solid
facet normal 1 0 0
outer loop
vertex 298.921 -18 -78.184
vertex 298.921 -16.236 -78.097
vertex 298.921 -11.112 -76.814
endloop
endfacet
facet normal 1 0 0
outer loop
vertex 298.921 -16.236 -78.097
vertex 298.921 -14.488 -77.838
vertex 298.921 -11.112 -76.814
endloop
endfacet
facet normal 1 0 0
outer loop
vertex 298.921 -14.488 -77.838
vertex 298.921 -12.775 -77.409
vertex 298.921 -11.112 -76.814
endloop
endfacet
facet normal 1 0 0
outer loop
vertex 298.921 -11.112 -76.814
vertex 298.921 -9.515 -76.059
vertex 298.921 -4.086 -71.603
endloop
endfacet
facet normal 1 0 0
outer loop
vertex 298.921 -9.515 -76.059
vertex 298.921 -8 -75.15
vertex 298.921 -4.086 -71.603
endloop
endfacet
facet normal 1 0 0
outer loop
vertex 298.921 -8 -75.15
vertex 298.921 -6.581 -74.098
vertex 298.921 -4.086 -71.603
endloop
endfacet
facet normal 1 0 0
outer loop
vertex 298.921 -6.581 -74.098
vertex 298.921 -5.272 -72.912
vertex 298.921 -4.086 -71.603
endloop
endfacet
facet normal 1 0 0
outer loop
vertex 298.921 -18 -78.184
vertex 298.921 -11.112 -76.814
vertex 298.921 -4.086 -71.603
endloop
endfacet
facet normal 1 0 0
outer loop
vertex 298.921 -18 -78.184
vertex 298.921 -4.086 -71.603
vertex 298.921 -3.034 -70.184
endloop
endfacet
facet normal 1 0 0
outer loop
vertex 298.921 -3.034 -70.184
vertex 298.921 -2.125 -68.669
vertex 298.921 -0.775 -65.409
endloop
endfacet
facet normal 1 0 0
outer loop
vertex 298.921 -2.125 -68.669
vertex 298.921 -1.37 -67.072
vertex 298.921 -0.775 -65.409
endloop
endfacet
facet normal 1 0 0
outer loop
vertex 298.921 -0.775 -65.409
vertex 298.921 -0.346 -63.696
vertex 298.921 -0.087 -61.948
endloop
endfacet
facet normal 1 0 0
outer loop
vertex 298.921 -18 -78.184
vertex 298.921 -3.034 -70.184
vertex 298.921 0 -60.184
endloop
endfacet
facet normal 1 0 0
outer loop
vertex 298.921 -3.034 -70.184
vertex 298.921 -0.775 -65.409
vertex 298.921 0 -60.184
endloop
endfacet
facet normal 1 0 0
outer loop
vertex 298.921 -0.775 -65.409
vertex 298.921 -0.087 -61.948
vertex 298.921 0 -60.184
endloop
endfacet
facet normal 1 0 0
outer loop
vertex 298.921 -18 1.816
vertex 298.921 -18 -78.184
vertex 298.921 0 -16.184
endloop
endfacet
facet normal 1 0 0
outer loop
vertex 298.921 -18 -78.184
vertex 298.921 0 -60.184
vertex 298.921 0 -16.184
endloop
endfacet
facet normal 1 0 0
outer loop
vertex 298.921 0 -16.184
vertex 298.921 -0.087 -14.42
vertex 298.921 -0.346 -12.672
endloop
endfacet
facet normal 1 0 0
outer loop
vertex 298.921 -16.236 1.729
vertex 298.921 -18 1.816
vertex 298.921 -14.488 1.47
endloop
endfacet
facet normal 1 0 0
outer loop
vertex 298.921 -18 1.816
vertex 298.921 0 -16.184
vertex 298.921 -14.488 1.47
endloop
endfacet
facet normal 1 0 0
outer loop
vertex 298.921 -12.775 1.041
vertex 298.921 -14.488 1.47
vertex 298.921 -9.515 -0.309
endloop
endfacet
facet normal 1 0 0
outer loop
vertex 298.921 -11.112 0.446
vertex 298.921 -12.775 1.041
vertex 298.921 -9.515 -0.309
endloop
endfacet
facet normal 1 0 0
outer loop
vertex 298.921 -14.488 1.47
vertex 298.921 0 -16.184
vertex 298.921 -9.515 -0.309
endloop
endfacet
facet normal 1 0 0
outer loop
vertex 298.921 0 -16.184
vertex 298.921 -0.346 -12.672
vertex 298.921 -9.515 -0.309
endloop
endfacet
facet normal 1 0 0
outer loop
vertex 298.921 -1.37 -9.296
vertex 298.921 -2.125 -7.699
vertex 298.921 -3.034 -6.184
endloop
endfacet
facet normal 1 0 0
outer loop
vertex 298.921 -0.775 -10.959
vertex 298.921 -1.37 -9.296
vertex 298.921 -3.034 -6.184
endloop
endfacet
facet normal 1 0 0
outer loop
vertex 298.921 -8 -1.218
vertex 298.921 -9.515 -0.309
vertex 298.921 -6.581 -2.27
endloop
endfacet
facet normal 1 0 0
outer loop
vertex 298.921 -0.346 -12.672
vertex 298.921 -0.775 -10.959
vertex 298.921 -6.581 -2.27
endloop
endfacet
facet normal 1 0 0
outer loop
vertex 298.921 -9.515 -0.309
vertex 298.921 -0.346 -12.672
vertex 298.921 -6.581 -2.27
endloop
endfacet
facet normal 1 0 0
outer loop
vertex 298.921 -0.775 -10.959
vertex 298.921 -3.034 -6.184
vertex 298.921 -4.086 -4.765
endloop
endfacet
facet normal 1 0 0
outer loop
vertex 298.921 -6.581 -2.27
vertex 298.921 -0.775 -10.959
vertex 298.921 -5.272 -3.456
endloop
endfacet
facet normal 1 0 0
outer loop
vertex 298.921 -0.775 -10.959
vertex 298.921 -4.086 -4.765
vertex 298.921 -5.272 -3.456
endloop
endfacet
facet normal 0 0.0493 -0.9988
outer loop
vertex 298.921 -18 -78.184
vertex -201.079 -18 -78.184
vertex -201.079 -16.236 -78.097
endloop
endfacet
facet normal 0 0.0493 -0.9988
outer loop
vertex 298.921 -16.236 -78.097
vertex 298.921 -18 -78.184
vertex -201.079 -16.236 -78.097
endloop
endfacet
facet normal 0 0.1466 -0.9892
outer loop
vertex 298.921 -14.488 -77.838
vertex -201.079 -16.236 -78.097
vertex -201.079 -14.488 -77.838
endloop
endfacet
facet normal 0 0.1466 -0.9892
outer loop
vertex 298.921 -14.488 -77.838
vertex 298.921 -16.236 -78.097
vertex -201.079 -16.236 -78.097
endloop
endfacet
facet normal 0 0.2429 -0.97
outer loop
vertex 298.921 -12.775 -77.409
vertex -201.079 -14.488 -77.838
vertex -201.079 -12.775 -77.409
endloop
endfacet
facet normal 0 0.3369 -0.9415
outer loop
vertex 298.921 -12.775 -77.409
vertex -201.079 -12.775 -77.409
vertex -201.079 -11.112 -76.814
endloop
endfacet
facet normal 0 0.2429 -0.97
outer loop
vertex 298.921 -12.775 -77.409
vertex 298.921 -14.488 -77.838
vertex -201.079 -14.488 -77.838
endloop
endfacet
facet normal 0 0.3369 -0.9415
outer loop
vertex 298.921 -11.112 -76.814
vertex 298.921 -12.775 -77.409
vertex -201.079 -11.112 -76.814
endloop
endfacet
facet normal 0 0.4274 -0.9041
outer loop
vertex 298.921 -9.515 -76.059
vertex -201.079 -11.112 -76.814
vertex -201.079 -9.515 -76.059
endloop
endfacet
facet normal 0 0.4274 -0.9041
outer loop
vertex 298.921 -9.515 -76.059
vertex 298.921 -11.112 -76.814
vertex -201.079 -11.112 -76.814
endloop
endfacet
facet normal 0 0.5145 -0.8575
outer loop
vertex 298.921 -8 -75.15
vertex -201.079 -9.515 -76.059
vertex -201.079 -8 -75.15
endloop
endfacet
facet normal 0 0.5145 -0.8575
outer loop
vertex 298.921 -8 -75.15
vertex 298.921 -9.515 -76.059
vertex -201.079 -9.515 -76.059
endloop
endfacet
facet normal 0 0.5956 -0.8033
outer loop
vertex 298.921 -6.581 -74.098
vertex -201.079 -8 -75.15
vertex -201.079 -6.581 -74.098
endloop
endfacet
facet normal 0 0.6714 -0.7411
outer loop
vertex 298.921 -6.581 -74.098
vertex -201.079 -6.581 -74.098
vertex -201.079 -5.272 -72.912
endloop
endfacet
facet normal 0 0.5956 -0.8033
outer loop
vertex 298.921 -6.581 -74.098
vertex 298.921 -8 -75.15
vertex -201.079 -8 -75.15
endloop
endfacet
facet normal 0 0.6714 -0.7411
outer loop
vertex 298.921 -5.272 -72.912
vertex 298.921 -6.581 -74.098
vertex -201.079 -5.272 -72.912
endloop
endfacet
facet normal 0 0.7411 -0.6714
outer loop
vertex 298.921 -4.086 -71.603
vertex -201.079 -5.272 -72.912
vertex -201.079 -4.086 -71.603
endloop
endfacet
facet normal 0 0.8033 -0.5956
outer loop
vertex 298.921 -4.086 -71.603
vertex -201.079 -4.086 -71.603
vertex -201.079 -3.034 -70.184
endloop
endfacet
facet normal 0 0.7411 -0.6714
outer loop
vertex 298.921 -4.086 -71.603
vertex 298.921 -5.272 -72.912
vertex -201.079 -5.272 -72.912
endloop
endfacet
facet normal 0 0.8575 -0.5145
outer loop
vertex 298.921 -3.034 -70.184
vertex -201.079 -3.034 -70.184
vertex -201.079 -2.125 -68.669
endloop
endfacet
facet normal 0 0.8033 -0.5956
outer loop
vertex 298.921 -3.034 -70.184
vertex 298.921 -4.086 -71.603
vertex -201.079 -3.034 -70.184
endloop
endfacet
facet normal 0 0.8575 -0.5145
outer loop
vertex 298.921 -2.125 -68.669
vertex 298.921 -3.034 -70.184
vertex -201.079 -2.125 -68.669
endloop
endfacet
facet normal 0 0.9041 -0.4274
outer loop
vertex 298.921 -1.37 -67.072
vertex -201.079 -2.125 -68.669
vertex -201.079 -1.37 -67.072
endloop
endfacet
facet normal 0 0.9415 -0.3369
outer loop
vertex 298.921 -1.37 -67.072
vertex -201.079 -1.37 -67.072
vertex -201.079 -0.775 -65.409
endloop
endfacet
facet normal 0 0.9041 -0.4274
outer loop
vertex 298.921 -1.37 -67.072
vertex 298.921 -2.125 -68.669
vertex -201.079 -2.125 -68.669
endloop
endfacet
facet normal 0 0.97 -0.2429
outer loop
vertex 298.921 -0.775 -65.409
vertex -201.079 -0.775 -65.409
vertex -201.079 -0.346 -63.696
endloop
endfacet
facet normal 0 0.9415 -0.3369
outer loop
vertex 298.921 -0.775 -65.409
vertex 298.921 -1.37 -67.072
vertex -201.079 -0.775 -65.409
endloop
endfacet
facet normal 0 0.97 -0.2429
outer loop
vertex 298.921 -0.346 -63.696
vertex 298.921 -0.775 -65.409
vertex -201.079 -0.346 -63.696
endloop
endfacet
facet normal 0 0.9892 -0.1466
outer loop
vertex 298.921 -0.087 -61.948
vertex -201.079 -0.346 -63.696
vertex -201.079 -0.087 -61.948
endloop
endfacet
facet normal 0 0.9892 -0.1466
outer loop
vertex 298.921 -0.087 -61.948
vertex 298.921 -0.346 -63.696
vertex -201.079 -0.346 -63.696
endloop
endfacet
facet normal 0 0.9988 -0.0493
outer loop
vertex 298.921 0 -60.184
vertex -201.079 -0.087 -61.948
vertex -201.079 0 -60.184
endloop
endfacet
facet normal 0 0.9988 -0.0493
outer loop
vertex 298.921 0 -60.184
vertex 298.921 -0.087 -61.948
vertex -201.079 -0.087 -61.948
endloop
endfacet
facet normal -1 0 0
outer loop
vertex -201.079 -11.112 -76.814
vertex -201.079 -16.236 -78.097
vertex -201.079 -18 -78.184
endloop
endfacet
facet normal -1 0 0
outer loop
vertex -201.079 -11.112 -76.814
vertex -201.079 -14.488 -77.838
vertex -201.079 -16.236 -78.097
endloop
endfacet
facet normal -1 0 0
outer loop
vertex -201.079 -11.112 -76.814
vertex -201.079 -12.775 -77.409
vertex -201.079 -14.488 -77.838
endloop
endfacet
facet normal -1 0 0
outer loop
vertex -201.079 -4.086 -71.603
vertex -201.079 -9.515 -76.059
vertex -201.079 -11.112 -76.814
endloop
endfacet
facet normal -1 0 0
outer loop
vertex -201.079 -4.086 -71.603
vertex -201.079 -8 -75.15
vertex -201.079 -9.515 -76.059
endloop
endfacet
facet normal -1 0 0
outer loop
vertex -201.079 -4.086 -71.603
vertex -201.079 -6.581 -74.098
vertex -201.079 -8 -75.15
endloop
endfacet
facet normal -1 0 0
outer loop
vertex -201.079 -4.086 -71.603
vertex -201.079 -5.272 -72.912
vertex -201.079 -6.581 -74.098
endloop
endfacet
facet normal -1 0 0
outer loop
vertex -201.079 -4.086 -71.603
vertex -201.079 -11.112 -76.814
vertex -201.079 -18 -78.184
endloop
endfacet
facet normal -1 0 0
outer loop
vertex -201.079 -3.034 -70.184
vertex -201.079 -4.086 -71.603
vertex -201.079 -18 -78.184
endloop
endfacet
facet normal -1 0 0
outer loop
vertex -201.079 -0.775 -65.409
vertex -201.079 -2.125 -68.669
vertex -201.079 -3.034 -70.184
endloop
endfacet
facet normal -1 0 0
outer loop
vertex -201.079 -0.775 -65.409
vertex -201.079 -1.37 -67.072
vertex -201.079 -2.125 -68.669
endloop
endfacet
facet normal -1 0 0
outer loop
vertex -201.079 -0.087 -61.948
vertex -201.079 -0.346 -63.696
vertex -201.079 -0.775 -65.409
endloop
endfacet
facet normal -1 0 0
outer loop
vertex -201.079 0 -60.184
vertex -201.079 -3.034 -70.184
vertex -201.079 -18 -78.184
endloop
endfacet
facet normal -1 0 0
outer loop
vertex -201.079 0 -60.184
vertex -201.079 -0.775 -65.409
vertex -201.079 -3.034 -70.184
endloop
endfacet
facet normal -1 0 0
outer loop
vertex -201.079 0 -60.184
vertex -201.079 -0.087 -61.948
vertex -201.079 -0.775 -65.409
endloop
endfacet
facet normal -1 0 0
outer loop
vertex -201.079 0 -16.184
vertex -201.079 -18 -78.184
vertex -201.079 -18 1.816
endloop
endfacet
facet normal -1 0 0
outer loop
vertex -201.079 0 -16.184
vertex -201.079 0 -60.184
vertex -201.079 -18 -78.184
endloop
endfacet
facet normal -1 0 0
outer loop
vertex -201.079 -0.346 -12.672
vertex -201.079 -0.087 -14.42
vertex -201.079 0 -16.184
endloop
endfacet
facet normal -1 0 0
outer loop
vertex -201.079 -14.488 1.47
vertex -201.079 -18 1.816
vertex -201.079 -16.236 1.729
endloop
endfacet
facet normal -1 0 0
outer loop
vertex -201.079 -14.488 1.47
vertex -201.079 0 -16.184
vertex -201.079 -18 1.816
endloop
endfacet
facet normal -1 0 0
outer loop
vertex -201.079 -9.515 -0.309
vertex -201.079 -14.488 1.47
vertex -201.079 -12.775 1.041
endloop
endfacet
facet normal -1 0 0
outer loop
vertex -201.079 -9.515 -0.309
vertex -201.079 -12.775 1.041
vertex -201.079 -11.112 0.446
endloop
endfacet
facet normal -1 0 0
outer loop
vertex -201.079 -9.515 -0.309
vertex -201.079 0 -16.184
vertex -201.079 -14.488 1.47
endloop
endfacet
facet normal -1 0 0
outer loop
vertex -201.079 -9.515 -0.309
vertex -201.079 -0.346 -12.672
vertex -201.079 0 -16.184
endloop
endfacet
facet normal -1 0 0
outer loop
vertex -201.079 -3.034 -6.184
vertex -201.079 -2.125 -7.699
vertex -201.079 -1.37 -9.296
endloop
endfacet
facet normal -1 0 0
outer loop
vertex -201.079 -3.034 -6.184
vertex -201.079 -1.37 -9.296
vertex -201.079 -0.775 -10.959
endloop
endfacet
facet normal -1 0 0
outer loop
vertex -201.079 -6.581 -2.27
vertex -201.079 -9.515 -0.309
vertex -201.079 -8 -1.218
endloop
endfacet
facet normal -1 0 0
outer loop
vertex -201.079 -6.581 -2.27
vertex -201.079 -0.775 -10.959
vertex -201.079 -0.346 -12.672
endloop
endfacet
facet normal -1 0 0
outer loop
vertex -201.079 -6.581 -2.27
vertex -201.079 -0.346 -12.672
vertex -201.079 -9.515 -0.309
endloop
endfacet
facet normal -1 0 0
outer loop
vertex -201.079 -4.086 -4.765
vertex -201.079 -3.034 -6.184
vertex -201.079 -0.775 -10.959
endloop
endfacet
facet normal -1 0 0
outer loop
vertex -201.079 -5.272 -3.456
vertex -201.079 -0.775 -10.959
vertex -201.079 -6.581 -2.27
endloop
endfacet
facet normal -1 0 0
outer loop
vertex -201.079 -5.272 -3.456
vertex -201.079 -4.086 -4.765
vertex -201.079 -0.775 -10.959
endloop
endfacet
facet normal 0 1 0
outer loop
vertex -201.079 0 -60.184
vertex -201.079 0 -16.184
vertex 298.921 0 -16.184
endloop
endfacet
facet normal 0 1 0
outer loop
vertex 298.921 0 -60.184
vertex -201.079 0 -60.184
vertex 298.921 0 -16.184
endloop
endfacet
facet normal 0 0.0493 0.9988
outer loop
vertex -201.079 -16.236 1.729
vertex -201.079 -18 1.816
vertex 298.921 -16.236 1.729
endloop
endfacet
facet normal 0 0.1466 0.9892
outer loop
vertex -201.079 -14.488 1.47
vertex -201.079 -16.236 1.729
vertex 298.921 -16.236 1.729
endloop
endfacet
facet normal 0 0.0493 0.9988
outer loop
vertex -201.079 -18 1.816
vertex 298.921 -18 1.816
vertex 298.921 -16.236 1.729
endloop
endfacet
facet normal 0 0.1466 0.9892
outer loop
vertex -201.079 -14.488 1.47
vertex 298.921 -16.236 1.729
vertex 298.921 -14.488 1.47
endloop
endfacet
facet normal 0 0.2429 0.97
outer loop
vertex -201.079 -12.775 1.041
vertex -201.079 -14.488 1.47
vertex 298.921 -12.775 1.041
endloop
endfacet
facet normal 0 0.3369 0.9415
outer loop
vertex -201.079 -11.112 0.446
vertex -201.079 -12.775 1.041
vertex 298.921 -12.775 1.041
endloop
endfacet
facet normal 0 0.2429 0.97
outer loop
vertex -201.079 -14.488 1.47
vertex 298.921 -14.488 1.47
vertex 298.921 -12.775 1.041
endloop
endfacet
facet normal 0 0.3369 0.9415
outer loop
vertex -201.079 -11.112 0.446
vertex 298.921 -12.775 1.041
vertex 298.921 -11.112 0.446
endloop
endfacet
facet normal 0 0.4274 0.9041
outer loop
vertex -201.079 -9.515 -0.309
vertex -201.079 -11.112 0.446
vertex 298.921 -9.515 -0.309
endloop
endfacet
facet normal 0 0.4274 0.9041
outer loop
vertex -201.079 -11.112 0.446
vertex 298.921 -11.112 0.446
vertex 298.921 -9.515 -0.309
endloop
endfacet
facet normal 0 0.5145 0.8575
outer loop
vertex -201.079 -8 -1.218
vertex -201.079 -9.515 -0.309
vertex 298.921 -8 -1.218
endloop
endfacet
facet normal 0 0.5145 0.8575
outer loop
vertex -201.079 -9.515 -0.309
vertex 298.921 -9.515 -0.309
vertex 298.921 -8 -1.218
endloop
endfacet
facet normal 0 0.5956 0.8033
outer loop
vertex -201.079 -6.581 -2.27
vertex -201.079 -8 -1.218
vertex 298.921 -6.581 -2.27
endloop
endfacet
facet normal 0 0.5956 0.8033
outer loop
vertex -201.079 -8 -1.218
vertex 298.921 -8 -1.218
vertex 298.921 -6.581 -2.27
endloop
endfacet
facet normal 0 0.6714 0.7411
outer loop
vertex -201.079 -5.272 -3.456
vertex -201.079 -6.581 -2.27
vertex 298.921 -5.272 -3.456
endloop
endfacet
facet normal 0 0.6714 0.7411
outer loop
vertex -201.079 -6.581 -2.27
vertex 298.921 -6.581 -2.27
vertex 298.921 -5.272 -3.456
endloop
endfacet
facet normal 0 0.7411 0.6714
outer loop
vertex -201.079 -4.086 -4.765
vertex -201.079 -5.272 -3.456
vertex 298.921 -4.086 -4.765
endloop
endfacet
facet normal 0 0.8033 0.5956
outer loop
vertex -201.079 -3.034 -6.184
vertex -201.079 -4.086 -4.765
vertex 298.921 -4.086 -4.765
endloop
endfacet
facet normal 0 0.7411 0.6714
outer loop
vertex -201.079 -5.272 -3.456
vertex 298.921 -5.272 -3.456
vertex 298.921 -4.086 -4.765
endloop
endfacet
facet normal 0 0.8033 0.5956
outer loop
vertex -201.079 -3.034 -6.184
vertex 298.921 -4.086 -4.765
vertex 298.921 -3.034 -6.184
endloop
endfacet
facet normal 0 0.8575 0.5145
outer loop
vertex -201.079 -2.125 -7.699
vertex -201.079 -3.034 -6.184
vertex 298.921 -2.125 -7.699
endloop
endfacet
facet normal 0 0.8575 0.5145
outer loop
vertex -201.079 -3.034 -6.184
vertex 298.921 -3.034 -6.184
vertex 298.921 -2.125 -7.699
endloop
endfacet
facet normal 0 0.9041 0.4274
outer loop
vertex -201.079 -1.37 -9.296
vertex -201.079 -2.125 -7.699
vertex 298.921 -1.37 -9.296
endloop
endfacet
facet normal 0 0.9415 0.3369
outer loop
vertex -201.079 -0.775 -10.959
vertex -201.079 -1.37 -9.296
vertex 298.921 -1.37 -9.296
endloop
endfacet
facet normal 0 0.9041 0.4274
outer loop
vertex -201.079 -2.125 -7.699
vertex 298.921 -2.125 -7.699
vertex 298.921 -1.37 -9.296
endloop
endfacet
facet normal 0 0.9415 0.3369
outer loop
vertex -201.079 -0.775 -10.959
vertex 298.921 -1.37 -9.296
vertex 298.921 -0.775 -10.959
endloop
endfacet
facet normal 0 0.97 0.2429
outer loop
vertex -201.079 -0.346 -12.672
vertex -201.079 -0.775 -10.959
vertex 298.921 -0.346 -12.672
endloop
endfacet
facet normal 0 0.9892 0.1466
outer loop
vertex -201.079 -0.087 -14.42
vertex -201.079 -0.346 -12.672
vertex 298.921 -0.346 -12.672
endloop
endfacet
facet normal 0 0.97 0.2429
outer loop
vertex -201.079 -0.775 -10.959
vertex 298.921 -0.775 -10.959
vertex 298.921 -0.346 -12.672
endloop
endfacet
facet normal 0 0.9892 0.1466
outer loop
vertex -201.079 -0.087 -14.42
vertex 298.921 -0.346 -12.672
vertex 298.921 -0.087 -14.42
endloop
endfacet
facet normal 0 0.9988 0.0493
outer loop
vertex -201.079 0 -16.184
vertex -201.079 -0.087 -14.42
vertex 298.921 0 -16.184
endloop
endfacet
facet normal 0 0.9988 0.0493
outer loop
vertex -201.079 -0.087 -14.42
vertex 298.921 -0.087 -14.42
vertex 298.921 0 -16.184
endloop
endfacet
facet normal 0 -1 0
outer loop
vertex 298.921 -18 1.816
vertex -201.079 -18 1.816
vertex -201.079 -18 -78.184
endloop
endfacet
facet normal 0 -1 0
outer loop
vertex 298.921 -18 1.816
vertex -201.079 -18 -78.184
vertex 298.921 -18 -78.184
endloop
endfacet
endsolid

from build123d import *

# Parameters (mm, degrees)
F0_W     = 500
F0_H     = 80
F1_DEPTH = 18
F2_R     = 17.99999


# Not quite as in the source:
# - a fillet or chamfer is up to 0.001 mm smaller than in the source, because OpenCascade refuses the exact size


with BuildPart() as f1:
    # F0 (on Front) → F1 (new body)
    with BuildSketch(Plane.XZ):
        with Locations((48.9213317633, -38.1839564443)):
            Rectangle(F0_W, F0_H)
    extrude(amount=F1_DEPTH)

    # F2 (radius 18 in the source; OpenCascade refuses exactly that, so slightly less here)
    f2_edges = [f1.edges().sort_by_distance(p)[0] for p in [
        (48.921332, 0, -78.183956),
        (48.921332, 0, 1.816044),
    ]]
    fillet(f2_edges, radius=F2_R)


solid = f1.part
